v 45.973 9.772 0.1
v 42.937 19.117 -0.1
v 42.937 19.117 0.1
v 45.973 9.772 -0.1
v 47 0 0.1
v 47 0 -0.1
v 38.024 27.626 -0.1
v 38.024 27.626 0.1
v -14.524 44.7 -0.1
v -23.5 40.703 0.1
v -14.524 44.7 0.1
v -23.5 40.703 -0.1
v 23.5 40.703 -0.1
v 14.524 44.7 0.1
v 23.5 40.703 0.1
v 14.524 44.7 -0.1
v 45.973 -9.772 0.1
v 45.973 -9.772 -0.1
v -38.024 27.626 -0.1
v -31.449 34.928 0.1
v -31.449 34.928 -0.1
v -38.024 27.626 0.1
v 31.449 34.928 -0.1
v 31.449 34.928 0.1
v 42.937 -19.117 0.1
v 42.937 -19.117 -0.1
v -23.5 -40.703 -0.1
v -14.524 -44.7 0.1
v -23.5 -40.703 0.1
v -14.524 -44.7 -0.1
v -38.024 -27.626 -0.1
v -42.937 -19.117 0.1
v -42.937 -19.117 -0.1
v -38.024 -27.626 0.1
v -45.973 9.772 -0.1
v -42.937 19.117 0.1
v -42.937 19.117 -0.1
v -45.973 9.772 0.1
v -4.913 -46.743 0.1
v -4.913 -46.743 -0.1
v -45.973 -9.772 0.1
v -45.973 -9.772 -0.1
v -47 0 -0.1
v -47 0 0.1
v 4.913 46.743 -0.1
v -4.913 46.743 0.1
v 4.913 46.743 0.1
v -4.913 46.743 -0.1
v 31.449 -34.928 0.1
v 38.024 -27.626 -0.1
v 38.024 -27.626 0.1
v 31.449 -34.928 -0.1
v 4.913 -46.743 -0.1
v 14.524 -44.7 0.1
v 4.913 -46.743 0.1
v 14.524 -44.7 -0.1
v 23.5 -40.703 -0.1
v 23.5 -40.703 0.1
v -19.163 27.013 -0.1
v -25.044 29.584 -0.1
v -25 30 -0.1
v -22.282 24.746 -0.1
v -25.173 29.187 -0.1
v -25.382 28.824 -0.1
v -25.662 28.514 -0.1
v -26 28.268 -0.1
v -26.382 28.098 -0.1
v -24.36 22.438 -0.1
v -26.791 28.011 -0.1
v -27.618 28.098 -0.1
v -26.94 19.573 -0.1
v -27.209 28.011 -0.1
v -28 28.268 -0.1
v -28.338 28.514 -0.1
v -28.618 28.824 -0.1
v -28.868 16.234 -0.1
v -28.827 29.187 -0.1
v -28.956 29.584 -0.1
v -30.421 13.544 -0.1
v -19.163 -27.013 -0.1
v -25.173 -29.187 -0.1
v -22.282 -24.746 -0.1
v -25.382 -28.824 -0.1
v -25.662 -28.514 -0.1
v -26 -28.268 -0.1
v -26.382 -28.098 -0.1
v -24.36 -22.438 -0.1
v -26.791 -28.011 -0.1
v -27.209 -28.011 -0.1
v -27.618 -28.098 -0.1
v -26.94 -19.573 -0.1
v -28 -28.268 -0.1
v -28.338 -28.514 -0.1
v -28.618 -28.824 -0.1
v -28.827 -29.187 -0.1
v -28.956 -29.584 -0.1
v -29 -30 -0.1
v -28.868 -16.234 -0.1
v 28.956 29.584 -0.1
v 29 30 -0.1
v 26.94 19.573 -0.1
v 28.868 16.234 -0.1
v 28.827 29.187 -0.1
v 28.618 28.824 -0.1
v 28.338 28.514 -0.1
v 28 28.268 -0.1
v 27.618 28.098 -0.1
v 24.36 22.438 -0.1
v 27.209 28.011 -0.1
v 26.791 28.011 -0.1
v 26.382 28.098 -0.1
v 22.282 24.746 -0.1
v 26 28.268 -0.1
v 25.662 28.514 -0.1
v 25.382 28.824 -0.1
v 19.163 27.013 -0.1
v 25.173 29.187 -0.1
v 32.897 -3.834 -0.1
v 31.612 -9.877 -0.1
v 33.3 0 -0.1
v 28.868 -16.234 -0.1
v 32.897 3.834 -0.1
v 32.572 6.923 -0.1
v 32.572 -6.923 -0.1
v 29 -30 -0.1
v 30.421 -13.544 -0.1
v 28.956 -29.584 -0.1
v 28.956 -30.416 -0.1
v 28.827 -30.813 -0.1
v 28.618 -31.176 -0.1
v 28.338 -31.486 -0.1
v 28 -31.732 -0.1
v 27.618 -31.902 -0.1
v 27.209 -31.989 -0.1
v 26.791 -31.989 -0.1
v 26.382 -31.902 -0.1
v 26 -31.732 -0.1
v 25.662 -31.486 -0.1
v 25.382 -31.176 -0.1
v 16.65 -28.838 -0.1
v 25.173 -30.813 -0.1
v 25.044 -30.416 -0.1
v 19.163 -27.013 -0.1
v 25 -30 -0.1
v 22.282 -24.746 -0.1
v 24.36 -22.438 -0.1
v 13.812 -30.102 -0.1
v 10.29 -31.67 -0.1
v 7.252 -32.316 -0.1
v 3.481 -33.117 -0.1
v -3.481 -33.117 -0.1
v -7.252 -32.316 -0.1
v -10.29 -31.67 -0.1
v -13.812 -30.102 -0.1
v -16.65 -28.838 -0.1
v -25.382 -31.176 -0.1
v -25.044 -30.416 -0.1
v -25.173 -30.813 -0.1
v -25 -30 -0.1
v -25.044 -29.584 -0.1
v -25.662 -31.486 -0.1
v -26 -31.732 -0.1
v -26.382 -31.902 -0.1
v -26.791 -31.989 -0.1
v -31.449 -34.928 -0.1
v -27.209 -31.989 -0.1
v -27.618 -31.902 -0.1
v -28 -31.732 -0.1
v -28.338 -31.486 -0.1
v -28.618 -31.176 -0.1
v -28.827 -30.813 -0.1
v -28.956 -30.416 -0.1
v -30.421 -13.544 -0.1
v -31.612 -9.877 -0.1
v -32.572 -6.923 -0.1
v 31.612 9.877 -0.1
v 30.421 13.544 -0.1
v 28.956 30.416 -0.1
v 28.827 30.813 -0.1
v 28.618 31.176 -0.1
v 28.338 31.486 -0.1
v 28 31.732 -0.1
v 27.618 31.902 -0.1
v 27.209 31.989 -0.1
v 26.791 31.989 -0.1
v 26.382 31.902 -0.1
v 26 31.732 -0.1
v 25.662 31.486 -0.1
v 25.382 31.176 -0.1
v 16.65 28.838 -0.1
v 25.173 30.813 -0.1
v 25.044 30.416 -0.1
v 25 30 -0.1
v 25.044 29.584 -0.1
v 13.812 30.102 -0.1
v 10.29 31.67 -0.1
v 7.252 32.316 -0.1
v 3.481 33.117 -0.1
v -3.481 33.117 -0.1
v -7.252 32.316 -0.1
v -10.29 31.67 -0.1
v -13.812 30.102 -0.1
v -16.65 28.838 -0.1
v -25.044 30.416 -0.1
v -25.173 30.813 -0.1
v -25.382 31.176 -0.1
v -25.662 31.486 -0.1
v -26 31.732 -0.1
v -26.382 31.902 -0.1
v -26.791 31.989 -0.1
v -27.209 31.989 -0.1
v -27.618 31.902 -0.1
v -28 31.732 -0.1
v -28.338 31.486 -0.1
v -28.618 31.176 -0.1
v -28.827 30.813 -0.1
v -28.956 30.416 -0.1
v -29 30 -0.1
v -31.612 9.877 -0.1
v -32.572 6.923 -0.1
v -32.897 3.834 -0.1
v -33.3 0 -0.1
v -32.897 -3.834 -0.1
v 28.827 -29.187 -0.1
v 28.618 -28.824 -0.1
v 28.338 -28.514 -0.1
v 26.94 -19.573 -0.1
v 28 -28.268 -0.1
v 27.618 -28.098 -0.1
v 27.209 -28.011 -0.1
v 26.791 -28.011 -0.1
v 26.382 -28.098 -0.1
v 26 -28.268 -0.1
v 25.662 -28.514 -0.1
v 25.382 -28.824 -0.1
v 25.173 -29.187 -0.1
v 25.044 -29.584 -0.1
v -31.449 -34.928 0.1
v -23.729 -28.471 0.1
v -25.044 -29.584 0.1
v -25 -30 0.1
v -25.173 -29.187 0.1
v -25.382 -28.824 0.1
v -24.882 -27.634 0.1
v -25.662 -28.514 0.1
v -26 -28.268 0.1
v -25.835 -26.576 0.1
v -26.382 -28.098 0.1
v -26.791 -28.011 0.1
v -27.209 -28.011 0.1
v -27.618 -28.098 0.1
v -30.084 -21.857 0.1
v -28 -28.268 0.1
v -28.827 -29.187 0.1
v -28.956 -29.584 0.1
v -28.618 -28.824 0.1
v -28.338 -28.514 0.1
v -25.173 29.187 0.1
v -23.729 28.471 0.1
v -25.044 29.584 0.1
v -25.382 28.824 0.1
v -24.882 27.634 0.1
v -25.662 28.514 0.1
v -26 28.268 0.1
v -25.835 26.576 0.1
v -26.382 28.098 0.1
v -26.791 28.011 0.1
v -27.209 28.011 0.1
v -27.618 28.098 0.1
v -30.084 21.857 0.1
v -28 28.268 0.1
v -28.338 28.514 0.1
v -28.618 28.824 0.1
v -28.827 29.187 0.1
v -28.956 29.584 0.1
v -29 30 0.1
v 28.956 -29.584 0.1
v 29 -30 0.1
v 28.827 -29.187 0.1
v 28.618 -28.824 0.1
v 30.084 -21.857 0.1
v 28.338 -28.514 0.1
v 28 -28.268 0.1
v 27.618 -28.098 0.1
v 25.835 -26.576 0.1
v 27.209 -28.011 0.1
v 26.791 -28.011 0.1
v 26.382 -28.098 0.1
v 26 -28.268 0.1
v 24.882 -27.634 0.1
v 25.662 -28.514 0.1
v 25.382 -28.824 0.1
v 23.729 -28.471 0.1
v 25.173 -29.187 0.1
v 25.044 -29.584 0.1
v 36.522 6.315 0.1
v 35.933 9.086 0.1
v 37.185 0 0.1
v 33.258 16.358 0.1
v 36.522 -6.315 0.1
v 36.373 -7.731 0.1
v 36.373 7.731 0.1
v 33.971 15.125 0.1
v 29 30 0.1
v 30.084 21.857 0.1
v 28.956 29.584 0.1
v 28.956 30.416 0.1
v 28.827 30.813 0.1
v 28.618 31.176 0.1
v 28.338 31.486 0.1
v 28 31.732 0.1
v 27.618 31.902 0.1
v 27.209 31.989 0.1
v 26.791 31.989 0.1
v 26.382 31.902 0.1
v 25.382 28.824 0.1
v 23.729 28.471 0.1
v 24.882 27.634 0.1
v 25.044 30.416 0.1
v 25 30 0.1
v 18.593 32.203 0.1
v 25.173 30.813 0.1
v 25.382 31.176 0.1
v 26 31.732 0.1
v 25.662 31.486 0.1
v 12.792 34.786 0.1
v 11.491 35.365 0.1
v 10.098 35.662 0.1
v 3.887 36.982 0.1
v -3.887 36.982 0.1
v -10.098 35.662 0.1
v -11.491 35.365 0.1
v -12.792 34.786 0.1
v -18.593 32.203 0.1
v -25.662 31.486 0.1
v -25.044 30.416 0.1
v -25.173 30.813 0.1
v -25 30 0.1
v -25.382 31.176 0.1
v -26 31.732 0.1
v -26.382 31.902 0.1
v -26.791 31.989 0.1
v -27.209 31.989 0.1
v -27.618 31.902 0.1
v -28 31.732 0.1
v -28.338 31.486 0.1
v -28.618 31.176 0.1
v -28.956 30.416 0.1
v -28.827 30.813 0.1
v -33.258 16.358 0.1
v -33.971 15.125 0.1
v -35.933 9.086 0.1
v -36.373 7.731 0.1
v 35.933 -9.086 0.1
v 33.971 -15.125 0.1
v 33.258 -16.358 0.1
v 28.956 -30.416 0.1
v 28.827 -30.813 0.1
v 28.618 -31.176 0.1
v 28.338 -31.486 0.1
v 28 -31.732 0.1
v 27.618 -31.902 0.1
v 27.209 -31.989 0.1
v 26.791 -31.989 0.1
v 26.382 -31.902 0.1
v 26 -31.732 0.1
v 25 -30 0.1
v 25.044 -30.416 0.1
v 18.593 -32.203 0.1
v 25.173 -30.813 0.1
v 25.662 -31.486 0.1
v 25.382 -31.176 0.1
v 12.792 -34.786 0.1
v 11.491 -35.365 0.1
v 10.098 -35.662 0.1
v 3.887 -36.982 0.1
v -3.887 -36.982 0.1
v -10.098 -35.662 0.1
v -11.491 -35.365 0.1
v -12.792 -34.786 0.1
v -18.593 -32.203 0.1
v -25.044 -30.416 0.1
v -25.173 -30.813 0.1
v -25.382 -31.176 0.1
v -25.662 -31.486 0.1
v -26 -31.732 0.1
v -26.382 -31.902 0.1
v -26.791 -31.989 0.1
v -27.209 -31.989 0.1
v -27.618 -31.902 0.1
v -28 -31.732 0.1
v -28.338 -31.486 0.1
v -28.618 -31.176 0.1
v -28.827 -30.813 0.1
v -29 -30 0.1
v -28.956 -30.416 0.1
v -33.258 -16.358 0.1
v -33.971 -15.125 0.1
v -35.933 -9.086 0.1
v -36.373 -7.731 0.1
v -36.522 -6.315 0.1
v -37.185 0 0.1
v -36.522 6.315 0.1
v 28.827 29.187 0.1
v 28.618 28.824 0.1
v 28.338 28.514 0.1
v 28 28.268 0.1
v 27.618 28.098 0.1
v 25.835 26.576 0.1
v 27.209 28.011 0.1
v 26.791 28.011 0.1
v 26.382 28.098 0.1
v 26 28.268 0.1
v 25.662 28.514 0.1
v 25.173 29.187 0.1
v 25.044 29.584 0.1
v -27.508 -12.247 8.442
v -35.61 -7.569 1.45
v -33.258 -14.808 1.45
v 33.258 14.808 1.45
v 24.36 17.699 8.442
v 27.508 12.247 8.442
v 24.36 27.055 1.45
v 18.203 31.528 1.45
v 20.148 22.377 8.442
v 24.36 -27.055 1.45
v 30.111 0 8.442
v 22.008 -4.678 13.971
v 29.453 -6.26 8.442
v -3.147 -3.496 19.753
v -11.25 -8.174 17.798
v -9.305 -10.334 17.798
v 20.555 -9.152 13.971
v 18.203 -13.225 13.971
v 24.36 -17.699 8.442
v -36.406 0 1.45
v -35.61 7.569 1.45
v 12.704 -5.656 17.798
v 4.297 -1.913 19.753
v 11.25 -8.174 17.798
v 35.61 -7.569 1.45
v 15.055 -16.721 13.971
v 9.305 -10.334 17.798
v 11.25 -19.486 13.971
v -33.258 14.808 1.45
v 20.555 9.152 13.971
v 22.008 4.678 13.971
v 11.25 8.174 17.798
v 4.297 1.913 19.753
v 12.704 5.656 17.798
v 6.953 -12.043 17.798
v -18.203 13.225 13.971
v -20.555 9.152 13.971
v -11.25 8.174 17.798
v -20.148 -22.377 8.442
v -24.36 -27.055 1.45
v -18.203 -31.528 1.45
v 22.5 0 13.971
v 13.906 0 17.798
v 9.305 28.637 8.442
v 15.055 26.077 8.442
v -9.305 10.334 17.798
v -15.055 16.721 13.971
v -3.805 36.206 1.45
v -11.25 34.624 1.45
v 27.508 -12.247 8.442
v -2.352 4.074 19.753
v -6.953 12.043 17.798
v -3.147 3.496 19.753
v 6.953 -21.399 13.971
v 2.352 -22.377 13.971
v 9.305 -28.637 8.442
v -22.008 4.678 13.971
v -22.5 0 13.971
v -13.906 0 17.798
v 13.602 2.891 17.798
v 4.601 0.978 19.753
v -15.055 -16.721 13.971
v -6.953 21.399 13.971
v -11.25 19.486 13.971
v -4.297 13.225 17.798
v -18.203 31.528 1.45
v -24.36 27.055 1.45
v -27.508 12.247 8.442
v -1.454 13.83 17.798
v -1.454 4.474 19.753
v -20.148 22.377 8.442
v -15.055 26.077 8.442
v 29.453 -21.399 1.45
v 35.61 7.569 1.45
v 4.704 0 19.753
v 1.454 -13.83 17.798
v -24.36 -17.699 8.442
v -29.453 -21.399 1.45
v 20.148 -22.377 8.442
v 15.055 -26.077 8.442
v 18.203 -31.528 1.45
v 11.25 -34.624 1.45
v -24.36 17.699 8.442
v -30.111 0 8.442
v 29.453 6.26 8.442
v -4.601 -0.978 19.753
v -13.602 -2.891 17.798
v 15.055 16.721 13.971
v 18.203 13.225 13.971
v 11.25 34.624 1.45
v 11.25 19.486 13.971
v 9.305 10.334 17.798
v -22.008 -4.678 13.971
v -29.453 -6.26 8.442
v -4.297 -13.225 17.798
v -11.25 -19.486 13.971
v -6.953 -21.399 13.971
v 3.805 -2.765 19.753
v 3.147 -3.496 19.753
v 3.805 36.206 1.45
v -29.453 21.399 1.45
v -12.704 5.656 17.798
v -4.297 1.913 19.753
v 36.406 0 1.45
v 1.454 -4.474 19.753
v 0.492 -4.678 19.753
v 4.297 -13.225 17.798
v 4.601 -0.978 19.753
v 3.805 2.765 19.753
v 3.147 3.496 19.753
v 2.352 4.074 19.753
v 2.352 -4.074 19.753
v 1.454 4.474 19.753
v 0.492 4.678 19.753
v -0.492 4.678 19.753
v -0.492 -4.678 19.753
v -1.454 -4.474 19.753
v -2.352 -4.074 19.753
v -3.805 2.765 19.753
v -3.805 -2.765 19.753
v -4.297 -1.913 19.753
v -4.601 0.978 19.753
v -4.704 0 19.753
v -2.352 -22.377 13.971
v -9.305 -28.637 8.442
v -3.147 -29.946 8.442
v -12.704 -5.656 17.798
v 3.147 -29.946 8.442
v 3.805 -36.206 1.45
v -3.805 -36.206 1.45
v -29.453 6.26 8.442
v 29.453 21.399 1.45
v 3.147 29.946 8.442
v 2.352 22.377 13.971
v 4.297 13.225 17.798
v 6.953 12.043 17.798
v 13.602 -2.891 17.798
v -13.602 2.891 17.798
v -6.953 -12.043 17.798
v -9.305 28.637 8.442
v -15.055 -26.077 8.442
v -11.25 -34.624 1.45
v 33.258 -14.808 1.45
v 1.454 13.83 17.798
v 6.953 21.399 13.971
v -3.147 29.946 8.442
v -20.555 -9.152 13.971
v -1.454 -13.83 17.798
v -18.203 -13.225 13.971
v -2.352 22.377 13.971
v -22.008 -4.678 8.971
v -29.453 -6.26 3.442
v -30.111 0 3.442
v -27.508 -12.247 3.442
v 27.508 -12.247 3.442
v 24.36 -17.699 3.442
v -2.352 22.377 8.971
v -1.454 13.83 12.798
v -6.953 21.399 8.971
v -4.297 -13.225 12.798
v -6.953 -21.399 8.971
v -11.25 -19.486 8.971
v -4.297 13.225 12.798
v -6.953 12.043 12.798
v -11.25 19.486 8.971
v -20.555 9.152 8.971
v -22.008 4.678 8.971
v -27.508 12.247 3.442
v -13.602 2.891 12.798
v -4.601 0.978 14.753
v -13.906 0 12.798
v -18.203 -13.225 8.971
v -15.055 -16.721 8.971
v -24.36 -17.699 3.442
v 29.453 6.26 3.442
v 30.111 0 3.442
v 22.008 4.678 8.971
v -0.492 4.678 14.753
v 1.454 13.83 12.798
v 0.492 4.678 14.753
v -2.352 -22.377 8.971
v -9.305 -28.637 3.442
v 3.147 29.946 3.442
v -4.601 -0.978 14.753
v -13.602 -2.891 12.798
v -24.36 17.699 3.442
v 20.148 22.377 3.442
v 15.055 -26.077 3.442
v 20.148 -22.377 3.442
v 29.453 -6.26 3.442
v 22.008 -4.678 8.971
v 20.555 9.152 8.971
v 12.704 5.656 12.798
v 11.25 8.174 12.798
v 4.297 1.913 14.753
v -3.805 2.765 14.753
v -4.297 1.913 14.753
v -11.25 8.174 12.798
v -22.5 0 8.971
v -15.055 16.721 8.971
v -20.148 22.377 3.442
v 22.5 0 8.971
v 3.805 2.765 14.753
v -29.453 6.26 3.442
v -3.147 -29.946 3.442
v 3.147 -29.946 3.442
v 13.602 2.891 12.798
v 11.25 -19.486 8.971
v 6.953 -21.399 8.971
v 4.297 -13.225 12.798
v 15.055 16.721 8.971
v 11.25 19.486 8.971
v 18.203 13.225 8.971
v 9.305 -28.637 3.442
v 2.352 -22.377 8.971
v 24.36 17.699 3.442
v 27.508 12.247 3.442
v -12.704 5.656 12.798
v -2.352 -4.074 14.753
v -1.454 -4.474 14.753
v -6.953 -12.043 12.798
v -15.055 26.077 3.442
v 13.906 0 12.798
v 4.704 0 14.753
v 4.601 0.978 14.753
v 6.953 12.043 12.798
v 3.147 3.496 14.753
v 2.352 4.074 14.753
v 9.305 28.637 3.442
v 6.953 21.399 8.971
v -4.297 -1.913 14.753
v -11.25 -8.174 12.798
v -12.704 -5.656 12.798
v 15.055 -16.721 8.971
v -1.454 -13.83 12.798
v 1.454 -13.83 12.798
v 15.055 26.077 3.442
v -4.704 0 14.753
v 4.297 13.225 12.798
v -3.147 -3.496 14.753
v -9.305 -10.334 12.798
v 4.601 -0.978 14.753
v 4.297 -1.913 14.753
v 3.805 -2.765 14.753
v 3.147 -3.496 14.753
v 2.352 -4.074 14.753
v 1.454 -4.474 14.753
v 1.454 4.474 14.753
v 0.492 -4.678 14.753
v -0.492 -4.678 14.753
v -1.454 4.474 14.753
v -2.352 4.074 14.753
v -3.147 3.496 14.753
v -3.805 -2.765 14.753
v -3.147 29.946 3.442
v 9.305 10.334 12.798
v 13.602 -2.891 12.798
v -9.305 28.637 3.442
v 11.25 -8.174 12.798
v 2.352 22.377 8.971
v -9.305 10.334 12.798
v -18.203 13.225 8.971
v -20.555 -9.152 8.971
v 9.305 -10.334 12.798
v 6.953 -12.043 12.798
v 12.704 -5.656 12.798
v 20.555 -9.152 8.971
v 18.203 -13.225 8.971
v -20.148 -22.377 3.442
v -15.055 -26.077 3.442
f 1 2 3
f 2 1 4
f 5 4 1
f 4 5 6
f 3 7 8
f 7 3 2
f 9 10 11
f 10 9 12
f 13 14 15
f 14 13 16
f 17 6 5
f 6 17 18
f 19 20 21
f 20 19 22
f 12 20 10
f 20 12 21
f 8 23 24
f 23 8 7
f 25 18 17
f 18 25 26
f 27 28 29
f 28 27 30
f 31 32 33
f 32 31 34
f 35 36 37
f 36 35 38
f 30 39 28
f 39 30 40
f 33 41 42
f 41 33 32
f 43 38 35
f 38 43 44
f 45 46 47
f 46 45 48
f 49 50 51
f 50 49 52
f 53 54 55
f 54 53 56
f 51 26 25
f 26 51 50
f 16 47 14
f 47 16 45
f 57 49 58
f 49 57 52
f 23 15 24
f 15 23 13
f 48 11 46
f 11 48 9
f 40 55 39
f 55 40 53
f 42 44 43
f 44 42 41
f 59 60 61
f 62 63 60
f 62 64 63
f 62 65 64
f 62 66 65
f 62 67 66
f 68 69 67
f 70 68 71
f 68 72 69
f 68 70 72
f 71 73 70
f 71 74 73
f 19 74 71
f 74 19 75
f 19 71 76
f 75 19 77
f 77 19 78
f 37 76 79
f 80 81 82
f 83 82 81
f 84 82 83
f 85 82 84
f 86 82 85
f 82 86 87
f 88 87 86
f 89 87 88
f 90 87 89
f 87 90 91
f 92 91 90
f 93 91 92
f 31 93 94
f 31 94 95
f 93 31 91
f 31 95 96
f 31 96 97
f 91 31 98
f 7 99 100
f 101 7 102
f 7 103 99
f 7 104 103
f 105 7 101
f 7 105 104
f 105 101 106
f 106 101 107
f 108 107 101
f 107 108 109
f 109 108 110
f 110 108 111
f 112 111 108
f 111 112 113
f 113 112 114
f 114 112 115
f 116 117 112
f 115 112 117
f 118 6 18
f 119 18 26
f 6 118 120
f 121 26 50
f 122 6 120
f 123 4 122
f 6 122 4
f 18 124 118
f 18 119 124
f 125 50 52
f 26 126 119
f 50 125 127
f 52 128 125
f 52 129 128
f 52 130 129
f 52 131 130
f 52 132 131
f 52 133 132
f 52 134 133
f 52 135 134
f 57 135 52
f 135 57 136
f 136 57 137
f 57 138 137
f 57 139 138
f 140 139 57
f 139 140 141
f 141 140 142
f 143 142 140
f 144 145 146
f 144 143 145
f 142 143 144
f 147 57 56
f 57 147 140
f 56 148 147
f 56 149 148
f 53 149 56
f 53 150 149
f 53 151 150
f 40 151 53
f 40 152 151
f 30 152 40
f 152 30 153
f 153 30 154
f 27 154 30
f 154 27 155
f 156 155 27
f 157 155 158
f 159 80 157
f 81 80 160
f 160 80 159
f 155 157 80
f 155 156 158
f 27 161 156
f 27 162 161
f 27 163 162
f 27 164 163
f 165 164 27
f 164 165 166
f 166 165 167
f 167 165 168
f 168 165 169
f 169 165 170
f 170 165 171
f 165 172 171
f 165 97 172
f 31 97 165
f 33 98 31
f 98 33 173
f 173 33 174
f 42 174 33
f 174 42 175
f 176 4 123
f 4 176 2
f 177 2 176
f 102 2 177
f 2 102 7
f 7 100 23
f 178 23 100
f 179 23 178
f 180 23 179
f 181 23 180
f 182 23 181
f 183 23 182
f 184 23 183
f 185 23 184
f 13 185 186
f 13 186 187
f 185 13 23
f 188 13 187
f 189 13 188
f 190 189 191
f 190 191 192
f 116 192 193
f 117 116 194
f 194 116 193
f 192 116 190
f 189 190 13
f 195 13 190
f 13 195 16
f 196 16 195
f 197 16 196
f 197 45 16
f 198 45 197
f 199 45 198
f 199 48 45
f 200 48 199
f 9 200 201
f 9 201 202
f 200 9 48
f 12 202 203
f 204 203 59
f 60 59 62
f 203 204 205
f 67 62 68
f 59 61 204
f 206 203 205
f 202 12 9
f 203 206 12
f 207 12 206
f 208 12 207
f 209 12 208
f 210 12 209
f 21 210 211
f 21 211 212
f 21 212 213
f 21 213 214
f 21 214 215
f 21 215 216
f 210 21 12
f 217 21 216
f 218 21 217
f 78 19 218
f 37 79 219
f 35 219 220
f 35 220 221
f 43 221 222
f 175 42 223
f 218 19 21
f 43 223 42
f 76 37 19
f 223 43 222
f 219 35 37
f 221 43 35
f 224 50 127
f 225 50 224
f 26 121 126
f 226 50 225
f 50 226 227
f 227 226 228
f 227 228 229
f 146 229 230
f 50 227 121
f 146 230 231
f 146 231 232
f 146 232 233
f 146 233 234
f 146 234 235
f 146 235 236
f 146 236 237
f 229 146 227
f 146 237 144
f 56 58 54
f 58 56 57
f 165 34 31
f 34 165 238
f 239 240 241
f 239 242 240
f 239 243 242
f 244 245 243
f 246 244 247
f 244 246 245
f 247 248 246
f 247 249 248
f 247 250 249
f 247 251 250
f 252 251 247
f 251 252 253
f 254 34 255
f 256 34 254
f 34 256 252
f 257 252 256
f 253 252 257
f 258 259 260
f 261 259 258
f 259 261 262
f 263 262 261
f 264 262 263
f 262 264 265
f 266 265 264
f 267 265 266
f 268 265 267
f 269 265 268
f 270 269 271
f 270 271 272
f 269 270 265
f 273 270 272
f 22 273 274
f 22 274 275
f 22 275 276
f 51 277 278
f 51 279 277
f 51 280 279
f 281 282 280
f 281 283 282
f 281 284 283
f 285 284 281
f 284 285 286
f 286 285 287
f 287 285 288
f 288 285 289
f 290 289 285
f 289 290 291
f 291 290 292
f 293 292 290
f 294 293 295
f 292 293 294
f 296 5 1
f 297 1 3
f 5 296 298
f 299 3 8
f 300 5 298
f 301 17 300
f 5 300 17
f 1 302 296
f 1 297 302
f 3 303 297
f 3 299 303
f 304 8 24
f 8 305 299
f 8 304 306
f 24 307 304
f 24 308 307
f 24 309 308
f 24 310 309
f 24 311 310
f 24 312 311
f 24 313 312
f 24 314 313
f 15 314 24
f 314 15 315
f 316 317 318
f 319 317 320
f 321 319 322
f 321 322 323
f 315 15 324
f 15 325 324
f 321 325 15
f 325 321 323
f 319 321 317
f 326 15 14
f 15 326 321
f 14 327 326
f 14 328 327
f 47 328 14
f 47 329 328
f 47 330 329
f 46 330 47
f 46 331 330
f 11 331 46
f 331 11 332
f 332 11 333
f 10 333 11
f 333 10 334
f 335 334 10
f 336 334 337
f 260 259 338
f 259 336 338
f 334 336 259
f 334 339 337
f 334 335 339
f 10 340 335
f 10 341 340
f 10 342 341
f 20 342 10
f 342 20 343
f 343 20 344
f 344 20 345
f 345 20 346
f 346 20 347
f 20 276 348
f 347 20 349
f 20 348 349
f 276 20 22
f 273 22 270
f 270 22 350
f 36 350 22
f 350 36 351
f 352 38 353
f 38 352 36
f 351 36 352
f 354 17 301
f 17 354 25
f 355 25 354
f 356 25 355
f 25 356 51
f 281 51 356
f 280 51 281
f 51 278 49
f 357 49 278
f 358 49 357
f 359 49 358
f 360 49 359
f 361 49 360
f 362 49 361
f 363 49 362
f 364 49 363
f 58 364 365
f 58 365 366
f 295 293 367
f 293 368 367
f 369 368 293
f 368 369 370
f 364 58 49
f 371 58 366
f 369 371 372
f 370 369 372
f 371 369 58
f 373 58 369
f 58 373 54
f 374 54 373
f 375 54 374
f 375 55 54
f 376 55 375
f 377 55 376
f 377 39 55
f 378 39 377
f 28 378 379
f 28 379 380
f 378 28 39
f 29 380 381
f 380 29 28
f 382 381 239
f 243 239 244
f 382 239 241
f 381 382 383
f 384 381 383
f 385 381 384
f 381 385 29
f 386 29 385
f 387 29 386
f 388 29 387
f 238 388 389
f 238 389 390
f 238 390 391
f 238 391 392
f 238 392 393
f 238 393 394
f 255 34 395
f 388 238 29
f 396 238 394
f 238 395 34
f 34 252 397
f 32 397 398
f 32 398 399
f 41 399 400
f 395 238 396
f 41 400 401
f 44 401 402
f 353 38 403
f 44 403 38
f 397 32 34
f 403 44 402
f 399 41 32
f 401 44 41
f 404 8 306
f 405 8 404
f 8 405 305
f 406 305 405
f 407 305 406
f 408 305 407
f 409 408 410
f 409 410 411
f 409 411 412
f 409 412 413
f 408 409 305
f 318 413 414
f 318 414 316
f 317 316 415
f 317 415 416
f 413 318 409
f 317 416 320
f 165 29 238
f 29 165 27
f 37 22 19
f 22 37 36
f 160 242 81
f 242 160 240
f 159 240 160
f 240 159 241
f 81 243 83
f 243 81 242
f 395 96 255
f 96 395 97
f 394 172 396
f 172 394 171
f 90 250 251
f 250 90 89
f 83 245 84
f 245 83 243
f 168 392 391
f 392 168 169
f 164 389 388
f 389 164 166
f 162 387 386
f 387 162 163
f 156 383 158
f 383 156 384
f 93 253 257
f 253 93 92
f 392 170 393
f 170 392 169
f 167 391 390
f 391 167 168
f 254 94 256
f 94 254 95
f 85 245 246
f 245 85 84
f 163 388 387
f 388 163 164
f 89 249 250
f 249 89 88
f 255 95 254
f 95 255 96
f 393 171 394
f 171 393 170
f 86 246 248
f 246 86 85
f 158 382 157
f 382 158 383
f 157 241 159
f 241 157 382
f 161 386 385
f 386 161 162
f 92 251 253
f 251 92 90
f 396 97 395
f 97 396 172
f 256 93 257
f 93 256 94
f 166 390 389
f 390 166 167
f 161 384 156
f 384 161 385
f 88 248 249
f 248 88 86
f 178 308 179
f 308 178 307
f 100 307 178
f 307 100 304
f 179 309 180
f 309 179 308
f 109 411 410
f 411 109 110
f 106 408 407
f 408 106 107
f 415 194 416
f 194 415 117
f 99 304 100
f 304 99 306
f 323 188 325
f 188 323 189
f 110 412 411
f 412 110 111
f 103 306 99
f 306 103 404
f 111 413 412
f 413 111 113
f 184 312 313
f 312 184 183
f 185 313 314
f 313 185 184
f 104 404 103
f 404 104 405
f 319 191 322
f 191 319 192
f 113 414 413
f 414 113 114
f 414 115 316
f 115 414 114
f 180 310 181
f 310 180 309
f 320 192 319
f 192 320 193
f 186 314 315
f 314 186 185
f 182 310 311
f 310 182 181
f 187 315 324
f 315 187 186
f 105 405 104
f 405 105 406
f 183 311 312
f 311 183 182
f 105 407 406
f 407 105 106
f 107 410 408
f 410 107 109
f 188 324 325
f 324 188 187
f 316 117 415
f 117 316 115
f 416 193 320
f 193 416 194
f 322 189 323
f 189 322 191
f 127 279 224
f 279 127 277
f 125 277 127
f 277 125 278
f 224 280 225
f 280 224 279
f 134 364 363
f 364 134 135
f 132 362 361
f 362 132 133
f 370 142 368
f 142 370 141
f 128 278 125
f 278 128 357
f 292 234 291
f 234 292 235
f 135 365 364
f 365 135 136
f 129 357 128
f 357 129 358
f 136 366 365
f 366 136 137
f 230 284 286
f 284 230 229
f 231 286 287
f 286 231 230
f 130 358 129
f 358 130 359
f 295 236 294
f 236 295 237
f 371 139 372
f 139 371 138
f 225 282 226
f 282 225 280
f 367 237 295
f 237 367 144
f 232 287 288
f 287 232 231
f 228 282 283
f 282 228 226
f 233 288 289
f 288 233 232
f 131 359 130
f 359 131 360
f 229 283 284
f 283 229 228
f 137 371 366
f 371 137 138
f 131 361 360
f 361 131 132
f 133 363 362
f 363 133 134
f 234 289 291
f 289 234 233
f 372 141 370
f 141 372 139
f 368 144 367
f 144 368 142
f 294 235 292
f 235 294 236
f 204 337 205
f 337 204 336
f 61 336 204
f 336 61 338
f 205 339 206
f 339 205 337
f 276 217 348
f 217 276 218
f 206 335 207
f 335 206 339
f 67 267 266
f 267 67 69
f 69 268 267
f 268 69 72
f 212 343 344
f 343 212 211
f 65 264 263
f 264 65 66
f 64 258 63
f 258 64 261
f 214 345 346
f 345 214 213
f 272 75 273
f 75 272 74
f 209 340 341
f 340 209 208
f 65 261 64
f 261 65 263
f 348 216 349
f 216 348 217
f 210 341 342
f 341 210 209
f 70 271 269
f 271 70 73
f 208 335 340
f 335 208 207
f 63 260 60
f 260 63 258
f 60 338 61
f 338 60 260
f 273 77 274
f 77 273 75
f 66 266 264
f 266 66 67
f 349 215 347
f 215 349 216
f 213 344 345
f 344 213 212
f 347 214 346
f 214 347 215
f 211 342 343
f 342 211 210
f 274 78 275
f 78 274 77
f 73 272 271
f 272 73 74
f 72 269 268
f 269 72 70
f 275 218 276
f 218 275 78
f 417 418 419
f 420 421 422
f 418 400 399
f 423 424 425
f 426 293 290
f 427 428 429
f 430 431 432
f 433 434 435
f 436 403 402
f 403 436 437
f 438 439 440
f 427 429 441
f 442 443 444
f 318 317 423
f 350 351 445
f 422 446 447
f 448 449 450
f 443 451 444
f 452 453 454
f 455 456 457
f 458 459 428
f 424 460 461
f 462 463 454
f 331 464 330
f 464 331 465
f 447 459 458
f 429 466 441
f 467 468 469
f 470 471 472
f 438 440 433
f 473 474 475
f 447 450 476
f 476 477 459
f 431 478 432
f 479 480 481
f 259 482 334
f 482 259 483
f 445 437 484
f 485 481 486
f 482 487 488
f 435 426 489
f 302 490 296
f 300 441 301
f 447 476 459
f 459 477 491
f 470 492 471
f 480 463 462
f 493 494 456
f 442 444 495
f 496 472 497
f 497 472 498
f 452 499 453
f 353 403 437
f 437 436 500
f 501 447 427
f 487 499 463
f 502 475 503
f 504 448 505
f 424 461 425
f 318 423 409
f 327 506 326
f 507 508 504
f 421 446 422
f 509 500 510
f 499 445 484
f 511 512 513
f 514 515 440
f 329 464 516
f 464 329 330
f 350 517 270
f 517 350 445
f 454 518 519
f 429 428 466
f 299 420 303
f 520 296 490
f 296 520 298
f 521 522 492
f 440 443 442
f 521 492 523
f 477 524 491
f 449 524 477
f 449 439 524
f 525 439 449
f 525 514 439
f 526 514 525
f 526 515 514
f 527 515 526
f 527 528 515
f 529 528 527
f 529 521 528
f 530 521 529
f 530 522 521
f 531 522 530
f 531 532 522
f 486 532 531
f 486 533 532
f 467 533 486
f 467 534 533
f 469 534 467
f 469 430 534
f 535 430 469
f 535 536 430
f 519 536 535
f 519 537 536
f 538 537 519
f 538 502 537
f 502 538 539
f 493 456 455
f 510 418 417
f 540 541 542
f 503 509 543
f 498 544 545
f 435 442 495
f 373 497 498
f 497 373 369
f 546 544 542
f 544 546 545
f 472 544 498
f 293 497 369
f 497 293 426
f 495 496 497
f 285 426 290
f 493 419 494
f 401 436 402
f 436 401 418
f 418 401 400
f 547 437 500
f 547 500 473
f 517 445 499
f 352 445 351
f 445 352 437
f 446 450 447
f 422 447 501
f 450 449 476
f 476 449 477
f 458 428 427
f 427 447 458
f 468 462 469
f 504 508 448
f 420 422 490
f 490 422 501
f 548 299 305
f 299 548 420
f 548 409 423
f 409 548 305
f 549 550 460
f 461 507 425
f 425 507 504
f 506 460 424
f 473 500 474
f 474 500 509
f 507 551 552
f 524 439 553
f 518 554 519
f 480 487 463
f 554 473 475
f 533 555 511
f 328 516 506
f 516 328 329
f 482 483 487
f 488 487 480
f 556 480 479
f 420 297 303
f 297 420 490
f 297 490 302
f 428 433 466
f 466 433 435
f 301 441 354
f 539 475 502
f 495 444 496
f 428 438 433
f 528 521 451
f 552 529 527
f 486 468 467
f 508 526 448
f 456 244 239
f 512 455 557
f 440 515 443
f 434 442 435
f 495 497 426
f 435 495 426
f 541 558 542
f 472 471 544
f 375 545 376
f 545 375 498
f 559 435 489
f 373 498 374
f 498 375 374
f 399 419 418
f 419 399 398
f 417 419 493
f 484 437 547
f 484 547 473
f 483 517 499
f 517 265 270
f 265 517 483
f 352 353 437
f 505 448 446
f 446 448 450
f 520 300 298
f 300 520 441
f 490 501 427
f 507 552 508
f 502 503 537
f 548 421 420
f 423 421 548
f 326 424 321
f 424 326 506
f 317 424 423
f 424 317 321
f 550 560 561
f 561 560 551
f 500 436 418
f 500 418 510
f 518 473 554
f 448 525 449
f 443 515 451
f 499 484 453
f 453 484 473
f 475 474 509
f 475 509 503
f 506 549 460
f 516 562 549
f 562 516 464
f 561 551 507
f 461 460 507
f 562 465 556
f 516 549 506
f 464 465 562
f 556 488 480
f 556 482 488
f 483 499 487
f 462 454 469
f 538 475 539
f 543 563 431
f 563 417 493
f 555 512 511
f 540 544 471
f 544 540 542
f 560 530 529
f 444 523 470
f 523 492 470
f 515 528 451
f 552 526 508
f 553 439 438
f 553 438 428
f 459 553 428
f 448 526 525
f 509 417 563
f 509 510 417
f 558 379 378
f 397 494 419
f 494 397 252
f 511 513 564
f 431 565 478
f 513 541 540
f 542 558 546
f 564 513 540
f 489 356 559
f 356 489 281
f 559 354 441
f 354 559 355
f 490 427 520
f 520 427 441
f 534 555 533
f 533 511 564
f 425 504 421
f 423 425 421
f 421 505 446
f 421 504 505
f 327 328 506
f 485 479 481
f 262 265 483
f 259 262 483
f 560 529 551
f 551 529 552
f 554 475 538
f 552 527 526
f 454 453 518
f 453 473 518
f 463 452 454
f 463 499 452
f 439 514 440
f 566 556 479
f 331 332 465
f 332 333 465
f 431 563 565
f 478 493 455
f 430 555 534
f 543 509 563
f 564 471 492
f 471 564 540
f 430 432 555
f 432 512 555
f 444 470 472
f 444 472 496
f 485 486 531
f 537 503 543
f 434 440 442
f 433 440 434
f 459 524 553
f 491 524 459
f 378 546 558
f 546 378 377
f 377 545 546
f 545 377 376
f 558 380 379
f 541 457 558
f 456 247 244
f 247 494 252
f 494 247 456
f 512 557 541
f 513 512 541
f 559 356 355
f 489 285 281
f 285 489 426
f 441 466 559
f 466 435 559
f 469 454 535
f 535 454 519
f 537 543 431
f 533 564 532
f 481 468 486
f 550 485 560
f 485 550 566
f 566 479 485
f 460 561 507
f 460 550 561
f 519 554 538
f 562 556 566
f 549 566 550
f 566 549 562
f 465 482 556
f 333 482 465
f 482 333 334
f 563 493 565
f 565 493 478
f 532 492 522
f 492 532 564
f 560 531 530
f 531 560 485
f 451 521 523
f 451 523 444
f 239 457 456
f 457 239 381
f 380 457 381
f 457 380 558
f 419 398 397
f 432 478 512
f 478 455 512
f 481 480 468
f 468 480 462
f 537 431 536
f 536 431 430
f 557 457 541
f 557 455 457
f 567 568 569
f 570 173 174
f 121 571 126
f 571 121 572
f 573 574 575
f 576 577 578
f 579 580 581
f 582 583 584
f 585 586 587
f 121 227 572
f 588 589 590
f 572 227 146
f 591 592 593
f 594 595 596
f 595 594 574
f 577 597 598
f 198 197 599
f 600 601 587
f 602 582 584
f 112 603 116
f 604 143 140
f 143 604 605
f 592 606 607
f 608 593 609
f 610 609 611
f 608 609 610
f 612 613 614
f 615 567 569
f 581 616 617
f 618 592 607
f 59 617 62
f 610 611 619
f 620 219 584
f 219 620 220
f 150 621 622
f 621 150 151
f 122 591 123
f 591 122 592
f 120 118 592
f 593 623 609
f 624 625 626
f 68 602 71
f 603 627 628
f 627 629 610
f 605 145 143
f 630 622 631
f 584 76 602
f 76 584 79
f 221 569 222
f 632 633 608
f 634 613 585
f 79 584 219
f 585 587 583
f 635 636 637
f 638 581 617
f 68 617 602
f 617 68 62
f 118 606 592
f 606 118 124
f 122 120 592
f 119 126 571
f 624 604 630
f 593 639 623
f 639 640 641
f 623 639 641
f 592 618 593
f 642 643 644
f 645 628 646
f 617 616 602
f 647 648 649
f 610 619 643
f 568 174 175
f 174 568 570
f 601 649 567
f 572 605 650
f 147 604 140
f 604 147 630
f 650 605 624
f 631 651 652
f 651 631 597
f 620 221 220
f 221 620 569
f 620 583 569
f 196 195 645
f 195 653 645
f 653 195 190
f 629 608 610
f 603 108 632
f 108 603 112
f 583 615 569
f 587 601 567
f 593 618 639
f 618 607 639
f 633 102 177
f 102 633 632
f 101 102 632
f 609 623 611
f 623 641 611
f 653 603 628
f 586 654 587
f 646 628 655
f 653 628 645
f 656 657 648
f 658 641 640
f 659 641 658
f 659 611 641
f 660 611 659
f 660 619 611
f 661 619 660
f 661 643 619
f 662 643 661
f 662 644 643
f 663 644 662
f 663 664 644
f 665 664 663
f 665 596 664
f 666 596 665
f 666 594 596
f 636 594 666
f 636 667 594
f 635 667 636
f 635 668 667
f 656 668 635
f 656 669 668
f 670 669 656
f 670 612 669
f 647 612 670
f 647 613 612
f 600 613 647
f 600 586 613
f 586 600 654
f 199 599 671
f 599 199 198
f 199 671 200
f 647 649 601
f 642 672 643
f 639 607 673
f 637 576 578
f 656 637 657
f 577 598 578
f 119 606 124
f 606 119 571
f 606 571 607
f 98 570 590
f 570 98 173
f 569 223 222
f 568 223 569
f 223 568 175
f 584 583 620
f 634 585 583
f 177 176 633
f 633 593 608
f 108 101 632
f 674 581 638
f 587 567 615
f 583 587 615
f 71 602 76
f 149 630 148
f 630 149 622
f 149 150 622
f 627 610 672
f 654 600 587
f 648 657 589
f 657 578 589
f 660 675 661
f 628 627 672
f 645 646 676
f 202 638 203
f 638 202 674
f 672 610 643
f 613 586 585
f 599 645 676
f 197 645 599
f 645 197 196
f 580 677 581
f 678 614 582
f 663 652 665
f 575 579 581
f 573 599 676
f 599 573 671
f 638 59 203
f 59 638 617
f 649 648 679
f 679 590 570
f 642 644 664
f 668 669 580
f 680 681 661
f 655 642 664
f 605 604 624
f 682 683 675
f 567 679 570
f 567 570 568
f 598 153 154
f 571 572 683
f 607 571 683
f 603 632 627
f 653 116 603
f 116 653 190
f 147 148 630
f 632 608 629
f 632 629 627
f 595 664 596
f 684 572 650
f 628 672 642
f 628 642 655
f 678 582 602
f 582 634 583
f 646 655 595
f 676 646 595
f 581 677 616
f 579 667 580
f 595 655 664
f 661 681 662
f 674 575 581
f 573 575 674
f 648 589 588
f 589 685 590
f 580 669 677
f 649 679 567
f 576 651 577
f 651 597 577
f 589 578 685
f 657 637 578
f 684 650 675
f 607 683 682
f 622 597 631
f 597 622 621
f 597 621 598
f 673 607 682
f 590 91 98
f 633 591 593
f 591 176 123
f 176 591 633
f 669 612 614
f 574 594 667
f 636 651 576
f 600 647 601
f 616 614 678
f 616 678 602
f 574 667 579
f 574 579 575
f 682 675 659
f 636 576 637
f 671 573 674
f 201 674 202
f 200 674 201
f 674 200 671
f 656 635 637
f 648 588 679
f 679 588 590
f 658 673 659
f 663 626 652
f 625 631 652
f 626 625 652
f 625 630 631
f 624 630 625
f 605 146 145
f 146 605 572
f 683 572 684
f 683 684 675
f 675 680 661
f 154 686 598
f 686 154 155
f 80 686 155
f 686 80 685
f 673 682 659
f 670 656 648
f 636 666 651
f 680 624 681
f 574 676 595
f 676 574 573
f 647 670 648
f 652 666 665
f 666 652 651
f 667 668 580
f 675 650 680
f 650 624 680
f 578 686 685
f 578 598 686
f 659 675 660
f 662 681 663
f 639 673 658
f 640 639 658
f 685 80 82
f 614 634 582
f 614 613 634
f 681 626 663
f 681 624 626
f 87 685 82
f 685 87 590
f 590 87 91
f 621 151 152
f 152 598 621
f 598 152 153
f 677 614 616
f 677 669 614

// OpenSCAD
// Parametros 
alturaCilindros = 0.5;
radioCilindros = 2;
r = 45;
h = 20;
center = false;
$fn = 30;

module parteSuperior(){
    //Ahuecar
    difference(){
        //unir semiesfera y cilindro
        union(){
            difference(){
                cylinder(h=0.2, r = 47, center = true, $fn=$fn);
                translate([-27, -30, 0])
                cilindro();
                translate([27, 30, 0])
                 cilindro();
                translate([27, -30, 0])
                 cilindro();
                translate([-27, 30, 0])
                 cilindro();
             }
                difference(){ 
                    //-- Cilindro con tapa superior redondeada
                    parteArriba(r = r, h = h, both = false, center = center, $fn = $fn);
                    translate([0,0,-35]){
                        cube([100,100,70], center = true); 
                    }
                }
        }
        translate([0,0,-15]){
        parteArriba(r=45, h=30, both=false, center=center, $fn=$fn);
        }
    }
}

parteSuperior();

module cilindro(){
    cylinder(h=alturaCilindros, r = radioCilindros, center = true);
}

module parteArriba(r = 4, 
                 h = 20, 
                 center = false, 
                 both = false, $fn = 30)
{
    hc = (both == true) ? h - 2 * r : h - r;
    //-- Calcular la traslacion para centrar el cilindro
    posc = (center == true) ? 0 : h/2;
      
    //-- Aplicar traslacion para el centrado
    translate([0, 0, posc]) 
     //-- Centrar la figura
    translate([0, 0, -h/2]) {
        //-- Cilindro + esfera
        cylinder(r = r, h = hc, $fn = $fn);
        translate([0, 0, hc]) 
        sphere(r = r, $fn = $fn);
     }
}
